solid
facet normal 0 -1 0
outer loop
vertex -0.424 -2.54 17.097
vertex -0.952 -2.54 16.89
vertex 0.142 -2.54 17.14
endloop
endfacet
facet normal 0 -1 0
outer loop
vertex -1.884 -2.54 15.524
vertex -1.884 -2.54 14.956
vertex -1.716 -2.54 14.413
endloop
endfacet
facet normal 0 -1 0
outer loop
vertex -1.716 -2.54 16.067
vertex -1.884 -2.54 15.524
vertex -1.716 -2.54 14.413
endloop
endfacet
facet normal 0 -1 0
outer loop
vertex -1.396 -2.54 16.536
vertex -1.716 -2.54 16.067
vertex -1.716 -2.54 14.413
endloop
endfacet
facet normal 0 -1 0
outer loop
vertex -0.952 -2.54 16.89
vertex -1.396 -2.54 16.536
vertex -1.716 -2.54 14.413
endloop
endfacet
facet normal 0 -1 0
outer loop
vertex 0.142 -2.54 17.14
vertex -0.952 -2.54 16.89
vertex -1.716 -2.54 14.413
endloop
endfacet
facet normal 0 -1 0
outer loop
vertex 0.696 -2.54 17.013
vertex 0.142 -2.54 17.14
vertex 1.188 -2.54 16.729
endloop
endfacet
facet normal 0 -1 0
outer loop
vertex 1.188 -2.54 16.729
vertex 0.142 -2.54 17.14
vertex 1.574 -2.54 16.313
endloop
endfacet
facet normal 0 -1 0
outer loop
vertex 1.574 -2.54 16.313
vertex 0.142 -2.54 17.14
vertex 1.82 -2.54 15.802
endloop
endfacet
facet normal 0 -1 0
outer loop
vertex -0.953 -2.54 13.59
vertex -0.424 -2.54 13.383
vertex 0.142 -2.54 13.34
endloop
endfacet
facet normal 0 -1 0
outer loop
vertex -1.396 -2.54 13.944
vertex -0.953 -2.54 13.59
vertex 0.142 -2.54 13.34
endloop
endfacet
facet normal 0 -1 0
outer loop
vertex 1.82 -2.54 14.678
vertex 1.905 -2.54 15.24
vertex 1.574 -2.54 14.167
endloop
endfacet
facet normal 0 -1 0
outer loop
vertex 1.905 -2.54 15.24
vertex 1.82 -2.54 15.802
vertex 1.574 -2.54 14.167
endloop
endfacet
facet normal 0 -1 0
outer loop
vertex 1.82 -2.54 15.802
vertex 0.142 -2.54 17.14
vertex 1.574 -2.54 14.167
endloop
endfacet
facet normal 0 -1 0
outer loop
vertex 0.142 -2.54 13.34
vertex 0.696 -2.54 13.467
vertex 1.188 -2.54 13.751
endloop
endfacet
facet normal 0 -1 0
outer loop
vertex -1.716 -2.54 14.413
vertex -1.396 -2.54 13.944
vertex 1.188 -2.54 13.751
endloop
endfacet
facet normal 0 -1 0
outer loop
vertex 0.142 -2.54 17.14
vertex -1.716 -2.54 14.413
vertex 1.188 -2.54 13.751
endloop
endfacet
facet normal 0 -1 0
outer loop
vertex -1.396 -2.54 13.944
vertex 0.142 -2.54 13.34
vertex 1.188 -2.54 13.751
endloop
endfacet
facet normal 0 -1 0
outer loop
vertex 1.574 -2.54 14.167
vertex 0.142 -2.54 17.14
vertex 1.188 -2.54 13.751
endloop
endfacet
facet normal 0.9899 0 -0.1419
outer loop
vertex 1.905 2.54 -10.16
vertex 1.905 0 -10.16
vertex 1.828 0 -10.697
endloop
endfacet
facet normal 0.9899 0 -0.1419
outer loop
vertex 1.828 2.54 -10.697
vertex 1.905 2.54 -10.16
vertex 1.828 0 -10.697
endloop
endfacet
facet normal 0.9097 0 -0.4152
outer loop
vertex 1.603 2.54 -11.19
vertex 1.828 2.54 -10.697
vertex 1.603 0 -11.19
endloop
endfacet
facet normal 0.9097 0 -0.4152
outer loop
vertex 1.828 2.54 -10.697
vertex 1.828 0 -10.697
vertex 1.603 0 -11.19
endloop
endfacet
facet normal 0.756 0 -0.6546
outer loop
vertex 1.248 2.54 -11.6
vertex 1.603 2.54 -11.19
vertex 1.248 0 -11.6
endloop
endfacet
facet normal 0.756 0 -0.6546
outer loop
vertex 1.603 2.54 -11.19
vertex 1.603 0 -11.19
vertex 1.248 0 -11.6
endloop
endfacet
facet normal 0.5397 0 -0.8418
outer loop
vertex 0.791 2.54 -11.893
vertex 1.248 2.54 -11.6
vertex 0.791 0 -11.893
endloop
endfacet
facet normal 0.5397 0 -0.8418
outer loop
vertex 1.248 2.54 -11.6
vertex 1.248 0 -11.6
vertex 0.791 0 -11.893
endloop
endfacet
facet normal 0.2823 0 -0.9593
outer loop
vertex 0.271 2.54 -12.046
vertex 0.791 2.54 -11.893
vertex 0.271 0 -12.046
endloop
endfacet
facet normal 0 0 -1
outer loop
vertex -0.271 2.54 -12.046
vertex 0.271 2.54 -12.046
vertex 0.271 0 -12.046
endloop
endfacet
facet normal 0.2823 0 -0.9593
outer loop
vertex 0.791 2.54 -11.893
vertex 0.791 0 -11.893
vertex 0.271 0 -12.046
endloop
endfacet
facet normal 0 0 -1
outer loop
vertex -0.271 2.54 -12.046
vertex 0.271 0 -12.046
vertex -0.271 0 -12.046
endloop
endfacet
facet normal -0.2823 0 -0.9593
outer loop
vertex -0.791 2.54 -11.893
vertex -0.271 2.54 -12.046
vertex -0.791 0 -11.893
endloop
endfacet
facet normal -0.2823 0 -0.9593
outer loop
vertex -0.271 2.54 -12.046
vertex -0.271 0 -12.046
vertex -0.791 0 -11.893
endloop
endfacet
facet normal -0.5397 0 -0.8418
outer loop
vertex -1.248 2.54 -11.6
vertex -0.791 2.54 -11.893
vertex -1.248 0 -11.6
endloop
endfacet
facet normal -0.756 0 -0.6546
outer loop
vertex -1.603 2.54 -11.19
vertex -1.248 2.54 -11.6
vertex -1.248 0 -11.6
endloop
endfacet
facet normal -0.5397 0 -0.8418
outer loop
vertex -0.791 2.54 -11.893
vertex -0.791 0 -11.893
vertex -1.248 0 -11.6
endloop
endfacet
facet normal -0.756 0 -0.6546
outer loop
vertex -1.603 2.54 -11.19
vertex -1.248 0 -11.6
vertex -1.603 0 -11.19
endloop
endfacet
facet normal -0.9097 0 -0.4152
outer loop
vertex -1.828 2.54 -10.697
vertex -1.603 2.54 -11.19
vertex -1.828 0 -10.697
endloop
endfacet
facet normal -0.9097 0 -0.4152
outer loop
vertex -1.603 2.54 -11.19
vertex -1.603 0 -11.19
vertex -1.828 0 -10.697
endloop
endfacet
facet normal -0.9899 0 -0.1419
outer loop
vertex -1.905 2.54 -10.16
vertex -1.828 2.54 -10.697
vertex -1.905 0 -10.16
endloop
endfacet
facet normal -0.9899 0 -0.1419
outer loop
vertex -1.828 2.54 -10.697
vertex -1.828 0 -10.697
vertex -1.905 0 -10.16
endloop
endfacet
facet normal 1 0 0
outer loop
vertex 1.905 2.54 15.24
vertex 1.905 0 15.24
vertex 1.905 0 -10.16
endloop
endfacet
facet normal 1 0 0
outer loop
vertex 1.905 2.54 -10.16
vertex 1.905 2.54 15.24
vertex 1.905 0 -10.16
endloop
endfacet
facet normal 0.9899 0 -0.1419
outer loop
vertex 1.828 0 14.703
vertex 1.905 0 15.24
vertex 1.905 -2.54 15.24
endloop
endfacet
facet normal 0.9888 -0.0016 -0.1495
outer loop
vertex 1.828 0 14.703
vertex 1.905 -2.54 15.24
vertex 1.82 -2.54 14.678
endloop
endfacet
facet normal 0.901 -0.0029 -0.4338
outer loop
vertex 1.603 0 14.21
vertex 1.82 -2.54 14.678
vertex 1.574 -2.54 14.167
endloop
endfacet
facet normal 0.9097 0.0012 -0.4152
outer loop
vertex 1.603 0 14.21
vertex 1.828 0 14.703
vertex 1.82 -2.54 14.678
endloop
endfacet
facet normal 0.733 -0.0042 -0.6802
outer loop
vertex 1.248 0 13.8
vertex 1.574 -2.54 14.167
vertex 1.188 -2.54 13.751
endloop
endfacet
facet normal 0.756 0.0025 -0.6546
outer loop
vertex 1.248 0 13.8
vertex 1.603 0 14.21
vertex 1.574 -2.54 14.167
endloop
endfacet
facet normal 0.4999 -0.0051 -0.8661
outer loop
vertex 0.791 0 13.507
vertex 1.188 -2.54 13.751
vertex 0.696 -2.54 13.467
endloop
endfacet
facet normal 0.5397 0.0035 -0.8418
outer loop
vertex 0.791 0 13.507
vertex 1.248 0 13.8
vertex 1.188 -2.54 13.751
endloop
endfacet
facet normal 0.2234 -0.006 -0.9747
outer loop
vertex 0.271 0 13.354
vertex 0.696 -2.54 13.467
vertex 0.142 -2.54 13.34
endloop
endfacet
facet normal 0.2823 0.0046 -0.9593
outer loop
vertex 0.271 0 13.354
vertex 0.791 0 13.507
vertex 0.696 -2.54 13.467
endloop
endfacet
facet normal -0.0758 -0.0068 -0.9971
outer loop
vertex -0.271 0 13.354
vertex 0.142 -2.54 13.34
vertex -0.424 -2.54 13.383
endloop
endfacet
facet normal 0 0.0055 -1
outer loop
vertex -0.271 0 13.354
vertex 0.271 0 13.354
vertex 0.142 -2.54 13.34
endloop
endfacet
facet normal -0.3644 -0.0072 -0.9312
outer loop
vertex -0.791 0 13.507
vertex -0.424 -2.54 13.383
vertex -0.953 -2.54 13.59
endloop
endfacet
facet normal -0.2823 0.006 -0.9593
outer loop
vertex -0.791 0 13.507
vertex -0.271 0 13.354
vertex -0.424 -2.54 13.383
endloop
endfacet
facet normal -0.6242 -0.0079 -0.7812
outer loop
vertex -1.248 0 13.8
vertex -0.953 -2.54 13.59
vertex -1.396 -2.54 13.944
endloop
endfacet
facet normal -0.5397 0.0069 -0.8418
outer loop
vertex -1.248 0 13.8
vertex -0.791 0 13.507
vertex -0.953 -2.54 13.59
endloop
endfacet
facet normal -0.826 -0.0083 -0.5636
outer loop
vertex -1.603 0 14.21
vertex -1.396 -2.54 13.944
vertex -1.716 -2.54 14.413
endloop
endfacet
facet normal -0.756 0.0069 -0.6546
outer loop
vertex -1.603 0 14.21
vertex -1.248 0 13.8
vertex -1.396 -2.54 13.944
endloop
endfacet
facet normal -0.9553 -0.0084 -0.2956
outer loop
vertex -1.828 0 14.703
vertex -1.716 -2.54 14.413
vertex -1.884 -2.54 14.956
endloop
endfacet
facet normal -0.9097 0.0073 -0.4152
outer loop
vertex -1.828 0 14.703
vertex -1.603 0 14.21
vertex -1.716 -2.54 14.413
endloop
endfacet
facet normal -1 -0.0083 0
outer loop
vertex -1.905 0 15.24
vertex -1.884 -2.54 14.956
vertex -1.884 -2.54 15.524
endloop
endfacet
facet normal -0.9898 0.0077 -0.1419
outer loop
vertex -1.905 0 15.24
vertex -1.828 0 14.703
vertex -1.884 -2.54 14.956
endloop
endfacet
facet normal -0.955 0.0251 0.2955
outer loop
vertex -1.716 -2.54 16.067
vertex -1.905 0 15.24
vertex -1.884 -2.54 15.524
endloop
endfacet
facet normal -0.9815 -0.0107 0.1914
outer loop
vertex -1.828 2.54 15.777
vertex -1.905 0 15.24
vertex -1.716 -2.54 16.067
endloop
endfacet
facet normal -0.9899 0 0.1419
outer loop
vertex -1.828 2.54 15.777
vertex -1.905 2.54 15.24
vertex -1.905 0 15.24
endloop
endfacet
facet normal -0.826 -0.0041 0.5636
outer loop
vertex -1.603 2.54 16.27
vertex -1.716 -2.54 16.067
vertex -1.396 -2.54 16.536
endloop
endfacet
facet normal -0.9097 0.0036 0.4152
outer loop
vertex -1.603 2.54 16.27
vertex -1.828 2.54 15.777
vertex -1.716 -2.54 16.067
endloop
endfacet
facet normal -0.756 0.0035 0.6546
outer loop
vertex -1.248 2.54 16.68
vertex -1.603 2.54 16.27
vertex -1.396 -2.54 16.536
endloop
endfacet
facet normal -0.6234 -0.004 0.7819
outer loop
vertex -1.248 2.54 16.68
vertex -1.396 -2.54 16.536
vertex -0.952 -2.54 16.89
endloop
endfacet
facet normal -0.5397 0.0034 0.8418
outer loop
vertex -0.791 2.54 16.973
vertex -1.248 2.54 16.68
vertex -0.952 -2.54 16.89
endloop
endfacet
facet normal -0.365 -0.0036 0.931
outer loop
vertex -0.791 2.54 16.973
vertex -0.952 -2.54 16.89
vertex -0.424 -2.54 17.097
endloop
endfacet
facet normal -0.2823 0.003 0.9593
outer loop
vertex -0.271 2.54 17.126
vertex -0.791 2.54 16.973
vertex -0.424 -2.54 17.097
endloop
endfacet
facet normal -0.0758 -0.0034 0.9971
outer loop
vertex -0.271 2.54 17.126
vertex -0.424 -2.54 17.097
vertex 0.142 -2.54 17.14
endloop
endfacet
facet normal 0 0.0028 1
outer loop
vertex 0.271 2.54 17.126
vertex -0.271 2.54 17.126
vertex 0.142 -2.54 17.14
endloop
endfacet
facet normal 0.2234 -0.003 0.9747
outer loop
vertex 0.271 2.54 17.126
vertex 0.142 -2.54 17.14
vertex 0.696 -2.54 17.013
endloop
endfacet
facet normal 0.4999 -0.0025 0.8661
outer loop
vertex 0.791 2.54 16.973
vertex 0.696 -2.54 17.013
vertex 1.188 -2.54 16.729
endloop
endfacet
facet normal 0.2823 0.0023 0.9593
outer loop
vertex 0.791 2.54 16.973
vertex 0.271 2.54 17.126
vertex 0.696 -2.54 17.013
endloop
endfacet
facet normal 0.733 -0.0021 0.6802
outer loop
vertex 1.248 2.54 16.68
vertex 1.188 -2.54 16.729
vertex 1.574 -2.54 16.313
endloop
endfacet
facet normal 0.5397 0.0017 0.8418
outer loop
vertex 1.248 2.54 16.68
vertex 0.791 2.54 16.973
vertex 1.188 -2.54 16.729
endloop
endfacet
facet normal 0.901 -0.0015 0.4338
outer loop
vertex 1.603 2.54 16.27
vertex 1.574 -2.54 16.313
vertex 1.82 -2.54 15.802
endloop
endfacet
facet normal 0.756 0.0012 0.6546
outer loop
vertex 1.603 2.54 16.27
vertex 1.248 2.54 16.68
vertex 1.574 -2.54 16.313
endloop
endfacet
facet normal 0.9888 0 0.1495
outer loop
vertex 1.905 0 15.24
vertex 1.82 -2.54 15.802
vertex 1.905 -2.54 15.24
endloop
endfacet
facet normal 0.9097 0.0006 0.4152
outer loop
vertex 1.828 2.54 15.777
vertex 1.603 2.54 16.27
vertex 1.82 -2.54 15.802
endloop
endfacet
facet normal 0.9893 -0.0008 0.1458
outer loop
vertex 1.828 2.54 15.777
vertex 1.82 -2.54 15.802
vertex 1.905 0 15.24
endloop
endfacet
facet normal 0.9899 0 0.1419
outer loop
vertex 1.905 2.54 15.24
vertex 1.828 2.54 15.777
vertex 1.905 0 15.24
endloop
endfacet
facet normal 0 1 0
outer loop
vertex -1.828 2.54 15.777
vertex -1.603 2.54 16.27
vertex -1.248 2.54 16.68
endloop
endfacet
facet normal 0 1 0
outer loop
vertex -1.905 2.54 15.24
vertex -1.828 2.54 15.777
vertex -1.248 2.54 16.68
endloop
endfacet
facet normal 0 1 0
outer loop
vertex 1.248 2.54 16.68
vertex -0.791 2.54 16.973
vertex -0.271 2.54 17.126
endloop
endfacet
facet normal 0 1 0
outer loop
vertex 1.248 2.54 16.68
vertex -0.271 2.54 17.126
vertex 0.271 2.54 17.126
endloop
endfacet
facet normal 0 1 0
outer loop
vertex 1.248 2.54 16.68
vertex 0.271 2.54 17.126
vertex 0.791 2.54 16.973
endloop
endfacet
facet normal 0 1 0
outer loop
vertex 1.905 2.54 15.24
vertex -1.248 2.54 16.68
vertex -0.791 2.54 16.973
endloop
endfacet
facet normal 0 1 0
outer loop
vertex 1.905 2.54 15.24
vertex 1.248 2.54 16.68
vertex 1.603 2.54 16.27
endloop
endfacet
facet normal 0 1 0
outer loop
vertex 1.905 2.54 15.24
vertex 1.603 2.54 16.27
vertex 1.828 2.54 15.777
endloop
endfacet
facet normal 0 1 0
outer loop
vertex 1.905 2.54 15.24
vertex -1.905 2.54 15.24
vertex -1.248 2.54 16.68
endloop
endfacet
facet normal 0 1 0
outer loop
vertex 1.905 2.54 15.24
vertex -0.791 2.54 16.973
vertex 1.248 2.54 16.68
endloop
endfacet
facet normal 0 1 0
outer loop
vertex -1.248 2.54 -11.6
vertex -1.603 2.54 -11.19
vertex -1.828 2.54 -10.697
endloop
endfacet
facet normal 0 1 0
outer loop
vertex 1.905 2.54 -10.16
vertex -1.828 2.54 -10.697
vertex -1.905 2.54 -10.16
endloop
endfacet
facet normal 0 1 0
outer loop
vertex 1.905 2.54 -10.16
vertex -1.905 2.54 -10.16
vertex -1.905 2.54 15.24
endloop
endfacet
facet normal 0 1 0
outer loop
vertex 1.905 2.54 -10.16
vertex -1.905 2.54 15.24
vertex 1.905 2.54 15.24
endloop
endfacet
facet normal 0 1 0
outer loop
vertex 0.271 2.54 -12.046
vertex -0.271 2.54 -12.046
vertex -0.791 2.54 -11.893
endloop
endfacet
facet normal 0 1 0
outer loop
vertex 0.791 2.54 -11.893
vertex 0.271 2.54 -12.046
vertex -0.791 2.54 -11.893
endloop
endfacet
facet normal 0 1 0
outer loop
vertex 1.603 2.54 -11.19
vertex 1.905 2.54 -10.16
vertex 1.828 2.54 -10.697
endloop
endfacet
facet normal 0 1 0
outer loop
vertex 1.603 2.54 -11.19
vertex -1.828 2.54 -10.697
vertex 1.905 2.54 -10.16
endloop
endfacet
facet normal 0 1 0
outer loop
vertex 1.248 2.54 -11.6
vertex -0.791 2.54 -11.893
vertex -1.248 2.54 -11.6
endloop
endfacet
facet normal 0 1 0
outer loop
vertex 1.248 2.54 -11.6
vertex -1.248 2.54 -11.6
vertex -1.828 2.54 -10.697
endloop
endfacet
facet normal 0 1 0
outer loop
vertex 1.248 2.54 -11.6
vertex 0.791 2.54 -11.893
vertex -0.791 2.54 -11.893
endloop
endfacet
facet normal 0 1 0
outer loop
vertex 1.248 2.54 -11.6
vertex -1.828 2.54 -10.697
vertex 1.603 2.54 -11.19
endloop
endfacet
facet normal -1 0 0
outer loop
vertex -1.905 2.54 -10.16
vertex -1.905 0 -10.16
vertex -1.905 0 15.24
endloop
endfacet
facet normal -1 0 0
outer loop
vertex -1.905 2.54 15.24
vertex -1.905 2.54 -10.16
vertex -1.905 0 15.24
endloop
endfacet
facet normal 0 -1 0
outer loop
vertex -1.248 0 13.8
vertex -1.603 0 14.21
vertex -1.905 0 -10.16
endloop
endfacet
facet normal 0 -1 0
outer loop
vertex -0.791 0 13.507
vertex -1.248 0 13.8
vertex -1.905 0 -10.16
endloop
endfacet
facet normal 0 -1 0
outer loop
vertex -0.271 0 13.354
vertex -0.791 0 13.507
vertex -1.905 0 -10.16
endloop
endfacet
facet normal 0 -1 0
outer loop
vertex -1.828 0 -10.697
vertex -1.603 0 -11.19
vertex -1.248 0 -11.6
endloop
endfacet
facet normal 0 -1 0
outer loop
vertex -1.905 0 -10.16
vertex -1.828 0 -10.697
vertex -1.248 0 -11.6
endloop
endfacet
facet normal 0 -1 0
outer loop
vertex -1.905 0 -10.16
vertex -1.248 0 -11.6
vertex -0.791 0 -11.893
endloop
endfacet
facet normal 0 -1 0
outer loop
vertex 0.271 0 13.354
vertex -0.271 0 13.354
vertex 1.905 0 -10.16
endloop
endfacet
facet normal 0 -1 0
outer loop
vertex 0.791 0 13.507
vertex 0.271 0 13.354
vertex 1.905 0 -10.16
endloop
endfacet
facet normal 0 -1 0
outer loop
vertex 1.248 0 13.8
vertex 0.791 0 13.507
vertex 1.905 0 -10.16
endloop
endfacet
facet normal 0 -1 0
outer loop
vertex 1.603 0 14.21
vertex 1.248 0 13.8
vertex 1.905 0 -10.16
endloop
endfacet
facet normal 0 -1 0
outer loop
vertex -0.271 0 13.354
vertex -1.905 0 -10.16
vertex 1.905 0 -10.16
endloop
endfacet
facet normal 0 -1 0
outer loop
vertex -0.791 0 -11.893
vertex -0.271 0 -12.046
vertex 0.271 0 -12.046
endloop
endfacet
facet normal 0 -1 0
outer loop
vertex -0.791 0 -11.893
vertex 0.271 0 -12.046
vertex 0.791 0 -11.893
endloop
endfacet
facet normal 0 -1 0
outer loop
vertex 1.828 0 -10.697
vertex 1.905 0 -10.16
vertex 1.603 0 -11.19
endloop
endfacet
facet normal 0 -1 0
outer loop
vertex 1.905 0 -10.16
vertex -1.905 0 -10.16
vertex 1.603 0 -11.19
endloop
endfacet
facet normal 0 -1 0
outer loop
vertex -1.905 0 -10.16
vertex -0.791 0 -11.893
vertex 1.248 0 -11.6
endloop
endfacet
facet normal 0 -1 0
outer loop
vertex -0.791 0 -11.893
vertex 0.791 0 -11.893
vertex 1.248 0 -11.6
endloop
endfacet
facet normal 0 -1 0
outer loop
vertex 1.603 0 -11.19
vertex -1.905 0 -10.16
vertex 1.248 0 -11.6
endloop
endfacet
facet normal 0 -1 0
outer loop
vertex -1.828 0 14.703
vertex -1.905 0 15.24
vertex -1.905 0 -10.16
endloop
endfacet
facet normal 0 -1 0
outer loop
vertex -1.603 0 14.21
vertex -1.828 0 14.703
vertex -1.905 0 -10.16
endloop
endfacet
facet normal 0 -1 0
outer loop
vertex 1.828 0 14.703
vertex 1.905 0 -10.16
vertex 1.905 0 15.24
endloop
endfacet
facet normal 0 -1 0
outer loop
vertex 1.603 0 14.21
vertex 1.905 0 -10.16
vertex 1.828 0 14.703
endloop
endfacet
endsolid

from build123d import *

# Parameters (mm, degrees)
BOSS_EXTRUDE1_DEPTH = 2.54
BOSS_EXTRUDE2_DEPTH = 2.54


with BuildPart() as part:
    # Sketch1 → Boss-Extrude1 (new body)
    with BuildSketch(Plane(origin=(0, 0, 0), x_dir=(1, 0, 0), z_dir=(0, 1, 0))):
        with BuildLine():
            Line((-1.905, 10.16), (-1.905, -15.24))
            ThreePointArc((-1.905, -15.24), (0, -13.335), (1.905, -15.24))
            Line((1.905, -15.24), (1.905, 10.16))
            ThreePointArc((1.905, 10.16), (0, 12.065), (-1.905, 10.16))
        make_face()
    extrude(amount=BOSS_EXTRUDE1_DEPTH)

    # Sketch1<3> → Boss-Extrude2 (add, symmetric)
    with BuildSketch(Plane(origin=(0, 0, 0), x_dir=(1, 0, 0), z_dir=(0, 1, 0))):
        with BuildLine():
            ThreePointArc((-1.905, -15.24), (0, -17.145), (1.905, -15.24))
            ThreePointArc((1.905, -15.24), (0, -13.335), (-1.905, -15.24))
        make_face()
    extrude(amount=BOSS_EXTRUDE2_DEPTH, both=True)


solid = part.part
